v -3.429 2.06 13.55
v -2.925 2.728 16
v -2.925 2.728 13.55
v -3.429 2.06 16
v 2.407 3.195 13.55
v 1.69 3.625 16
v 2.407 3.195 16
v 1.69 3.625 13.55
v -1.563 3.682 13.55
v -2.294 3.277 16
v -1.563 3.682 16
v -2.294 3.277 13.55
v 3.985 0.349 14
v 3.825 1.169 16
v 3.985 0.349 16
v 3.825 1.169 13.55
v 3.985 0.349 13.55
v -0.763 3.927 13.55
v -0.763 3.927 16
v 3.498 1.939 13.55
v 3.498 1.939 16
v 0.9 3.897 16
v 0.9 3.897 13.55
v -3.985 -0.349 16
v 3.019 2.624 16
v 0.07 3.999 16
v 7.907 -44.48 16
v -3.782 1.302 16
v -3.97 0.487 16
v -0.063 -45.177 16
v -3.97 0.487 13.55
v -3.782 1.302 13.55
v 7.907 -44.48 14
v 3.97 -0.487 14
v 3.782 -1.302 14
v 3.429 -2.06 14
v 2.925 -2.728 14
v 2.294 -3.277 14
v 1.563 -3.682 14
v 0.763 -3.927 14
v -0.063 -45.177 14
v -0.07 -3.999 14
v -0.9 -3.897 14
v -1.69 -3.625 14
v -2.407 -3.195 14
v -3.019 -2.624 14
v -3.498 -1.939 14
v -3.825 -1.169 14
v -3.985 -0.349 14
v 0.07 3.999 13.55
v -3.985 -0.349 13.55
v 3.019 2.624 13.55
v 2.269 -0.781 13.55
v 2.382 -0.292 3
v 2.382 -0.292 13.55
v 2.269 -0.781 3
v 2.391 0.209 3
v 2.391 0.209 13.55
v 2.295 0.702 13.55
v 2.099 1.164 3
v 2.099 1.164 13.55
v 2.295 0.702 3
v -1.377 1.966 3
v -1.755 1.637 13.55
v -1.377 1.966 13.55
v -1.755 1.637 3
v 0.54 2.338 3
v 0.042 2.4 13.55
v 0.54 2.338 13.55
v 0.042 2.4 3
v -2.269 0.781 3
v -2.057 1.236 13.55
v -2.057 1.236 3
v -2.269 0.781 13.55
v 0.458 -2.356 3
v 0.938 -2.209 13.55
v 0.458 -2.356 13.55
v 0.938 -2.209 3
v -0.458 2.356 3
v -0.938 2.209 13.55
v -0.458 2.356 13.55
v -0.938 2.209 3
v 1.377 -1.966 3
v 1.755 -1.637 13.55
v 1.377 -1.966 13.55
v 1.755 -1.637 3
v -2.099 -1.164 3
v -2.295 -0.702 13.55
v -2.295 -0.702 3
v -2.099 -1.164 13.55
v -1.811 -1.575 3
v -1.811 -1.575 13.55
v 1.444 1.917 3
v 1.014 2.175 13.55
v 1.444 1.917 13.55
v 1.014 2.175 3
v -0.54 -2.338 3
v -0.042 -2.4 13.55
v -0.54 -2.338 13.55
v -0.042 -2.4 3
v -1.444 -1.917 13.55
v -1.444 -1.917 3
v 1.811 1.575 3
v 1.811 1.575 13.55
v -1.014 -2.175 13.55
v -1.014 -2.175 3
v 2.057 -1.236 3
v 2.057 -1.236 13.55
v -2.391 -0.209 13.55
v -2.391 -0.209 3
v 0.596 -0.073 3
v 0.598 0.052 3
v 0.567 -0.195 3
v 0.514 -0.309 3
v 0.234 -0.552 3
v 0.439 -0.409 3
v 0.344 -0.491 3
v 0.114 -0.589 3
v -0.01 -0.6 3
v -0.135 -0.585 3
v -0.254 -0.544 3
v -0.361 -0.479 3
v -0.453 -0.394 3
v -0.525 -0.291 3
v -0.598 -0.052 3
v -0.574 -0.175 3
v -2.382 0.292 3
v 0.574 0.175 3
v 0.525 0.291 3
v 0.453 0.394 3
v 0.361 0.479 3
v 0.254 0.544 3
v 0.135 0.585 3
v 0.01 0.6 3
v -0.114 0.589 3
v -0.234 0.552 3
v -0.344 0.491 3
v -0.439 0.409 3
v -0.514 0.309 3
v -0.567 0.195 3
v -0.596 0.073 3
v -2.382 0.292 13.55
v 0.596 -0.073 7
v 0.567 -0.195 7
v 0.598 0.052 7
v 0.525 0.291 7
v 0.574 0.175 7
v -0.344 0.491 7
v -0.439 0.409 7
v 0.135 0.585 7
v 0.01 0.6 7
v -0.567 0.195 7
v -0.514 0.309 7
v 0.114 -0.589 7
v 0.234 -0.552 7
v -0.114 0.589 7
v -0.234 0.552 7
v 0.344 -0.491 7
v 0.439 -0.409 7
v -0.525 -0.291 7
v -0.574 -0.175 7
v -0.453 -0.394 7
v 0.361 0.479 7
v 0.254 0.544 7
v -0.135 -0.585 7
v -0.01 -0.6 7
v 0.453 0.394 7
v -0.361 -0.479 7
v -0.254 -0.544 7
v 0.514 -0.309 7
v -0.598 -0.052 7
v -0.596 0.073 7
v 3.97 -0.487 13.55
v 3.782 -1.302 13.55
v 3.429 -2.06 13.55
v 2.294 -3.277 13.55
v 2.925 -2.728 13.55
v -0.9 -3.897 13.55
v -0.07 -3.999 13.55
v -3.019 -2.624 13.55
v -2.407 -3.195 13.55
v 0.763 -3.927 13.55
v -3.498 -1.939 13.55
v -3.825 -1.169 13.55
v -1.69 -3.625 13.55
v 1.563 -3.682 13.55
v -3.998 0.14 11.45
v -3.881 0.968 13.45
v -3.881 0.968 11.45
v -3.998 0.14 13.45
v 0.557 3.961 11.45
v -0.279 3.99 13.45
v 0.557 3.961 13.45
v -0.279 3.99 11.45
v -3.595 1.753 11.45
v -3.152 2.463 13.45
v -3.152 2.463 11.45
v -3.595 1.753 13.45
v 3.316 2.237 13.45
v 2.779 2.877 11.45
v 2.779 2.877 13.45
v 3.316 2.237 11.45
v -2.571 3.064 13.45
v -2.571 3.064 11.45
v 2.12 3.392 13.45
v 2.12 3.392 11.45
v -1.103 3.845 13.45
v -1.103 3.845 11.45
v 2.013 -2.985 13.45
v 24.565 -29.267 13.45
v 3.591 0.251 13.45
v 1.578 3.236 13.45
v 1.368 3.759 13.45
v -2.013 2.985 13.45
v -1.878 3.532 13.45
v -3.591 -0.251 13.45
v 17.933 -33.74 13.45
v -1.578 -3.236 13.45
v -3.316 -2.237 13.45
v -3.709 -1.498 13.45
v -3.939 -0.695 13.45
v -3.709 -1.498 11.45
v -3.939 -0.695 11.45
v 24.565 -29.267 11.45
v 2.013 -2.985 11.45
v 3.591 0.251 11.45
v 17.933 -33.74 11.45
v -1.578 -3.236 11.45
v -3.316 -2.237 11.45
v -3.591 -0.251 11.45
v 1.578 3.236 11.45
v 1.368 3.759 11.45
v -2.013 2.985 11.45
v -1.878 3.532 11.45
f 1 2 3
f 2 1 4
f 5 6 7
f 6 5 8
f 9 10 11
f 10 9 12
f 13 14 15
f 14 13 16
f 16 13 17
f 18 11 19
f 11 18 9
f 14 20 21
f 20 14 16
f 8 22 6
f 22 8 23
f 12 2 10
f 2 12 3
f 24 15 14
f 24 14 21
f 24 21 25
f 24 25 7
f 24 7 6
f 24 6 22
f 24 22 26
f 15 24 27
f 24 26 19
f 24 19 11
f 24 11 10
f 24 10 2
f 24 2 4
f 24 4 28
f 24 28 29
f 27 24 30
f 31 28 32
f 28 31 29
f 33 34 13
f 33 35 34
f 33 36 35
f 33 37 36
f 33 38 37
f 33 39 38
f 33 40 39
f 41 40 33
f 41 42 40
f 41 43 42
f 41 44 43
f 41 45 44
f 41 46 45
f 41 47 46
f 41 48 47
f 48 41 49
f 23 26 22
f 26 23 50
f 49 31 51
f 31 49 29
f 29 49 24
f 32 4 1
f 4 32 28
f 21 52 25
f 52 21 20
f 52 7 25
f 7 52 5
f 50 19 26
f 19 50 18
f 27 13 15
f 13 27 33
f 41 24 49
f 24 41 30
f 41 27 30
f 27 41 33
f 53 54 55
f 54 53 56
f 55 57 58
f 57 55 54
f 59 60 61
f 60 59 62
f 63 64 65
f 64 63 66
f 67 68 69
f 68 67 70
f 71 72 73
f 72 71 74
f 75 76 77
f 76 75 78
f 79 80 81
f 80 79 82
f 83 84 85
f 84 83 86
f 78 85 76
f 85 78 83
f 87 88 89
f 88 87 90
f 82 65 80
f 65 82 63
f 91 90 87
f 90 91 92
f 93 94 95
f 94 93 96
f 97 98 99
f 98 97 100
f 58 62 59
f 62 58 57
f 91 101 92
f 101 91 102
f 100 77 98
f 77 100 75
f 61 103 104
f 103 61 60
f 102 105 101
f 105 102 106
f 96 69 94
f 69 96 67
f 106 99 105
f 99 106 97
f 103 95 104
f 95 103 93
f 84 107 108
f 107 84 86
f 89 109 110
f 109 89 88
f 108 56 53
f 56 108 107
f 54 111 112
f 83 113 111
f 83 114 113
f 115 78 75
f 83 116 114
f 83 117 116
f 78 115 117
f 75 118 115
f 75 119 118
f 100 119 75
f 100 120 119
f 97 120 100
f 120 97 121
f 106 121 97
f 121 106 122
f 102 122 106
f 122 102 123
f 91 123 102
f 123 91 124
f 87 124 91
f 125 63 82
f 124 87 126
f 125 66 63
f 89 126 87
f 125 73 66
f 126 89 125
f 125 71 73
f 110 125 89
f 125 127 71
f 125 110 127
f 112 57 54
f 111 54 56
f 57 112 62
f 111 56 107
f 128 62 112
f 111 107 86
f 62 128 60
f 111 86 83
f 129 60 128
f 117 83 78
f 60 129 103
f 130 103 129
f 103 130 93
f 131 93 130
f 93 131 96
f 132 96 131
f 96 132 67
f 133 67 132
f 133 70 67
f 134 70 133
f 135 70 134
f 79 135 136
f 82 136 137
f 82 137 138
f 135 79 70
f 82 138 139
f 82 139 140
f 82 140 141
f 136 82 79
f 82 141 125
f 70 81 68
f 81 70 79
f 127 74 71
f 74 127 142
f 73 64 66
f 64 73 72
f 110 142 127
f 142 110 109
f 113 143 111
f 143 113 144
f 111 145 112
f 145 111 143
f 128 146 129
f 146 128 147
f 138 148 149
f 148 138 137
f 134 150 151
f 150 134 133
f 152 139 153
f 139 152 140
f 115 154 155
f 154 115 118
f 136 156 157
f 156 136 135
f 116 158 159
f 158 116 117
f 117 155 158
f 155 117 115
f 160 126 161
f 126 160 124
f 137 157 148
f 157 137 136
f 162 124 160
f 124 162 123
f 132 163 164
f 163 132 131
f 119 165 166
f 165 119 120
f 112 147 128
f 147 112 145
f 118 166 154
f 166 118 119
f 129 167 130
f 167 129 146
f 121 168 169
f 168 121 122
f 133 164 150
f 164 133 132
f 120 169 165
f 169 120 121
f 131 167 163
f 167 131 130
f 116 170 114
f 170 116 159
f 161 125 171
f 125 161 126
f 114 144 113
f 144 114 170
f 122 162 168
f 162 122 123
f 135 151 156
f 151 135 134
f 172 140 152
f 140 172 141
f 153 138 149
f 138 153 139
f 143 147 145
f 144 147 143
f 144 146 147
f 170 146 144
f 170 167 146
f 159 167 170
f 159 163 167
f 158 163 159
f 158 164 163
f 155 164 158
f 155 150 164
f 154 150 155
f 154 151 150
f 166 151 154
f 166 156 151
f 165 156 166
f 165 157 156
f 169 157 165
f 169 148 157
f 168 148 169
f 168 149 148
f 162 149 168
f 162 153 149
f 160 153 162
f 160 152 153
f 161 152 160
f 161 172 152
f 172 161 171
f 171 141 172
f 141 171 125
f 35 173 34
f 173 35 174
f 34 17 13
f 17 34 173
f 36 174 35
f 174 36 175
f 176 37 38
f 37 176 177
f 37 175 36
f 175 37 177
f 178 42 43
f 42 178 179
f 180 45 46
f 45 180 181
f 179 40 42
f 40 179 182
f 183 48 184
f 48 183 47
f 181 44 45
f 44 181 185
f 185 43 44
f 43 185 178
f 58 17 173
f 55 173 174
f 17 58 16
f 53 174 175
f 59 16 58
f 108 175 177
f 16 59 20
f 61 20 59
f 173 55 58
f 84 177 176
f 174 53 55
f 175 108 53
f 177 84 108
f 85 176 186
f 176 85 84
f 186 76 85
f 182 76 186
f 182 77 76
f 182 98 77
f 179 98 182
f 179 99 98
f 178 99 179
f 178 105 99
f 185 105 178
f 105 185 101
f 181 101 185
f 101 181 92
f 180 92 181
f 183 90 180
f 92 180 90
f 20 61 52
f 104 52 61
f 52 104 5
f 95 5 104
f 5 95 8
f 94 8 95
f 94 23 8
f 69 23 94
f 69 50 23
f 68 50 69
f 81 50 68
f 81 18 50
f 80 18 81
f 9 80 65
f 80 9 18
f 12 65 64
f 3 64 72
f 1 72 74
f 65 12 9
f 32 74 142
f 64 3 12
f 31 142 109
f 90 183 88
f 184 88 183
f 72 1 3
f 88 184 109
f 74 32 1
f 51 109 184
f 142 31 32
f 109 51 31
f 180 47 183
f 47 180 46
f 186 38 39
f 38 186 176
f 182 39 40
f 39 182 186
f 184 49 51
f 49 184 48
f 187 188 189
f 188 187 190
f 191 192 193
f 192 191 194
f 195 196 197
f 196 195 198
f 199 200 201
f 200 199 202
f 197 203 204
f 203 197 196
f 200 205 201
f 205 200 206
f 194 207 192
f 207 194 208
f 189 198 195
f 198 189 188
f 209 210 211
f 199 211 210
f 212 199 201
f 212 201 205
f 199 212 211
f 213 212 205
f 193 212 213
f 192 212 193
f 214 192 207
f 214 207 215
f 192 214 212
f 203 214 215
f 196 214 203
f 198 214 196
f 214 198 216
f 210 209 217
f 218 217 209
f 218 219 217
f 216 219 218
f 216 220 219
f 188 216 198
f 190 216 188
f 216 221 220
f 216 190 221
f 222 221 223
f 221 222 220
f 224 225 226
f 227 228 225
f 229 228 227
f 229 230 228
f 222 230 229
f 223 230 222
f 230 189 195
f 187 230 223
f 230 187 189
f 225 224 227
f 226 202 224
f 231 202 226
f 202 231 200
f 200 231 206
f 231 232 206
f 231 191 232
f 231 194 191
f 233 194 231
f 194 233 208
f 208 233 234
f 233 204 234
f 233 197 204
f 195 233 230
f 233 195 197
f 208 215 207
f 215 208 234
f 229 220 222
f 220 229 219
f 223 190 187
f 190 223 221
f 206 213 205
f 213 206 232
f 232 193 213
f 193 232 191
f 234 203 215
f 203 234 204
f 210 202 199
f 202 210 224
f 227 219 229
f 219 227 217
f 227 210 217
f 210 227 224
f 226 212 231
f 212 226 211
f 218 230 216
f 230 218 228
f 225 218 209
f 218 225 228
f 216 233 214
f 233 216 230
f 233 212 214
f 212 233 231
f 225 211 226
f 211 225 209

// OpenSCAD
// file: parametric_involute_gear_v5.0.scad
// Parametric Involute Bevel and Spur Gears by GregFrost
// It is licensed under the Creative Commons - GNU GPL license.
// © 2010 by GregFrost
// http://www.thingiverse.com/thing:3575

// Simple Test:
//gear (circular_pitch=700,
//	gear_thickness = 12,
//	rim_thickness = 15,
//	hub_thickness = 17,
//	circles=8);

//Complex Spur Gear Test:
//test_gears ();

// Meshing Double Helix:
//meshing_double_helix ();

// Demonstrate the backlash option for Spur gears.
//test_backlash ();

// Demonstrate how to make meshing bevel gears.
bevel_gear_pair ();

pi=3.1415926535897932384626433832795;

//==================================================
// Bevel Gears:
// Two gears with the same cone distance, circular pitch (measured at the cone distance) 
// and pressure angle will mesh.

module bevel_gear_pair (
	gear1_teeth = 41,
	gear2_teeth = 7,
	axis_angle = 90,
	outside_circular_pitch=1000)
{
	outside_pitch_radius1 = gear1_teeth * outside_circular_pitch / 360;
	outside_pitch_radius2 = gear2_teeth * outside_circular_pitch / 360;
	pitch_apex1=outside_pitch_radius2 * sin (axis_angle) + 
		(outside_pitch_radius2 * cos (axis_angle) + outside_pitch_radius1) / tan (axis_angle);
	cone_distance = sqrt (pow (pitch_apex1, 2) + pow (outside_pitch_radius1, 2));
	pitch_apex2 = sqrt (pow (cone_distance, 2) - pow (outside_pitch_radius2, 2));
	echo ("cone_distance", cone_distance);
	pitch_angle1 = asin (outside_pitch_radius1 / cone_distance);
	pitch_angle2 = asin (outside_pitch_radius2 / cone_distance);
	echo ("pitch_angle1, pitch_angle2", pitch_angle1, pitch_angle2);
	echo ("pitch_angle1 + pitch_angle2", pitch_angle1 + pitch_angle2);

	rotate([0,0,90])
	translate ([0,0,pitch_apex1+20])
	{
		translate([0,0,-pitch_apex1])
		bevel_gear (
			number_of_teeth=gear1_teeth,
			cone_distance=cone_distance,
			pressure_angle=30,
			outside_circular_pitch=outside_circular_pitch);
	
		rotate([0,-(pitch_angle1+pitch_angle2),0])
		translate([0,0,-pitch_apex2])
		bevel_gear (
			number_of_teeth=gear2_teeth,
			cone_distance=cone_distance,
			pressure_angle=30,
			outside_circular_pitch=outside_circular_pitch);
	}
}

//Bevel Gear Finishing Options:
bevel_gear_flat = 0;
bevel_gear_back_cone = 1;

module bevel_gear (
	number_of_teeth=11,
	cone_distance=100,
	face_width=20,
	outside_circular_pitch=1000,
	pressure_angle=30,
	clearance = 0.2,
	bore_diameter=5,
	gear_thickness = 15,
	backlash = 0,
	involute_facets=0,
	finish = -1)
{
	echo ("bevel_gear",
		"teeth", number_of_teeth,
		"cone distance", cone_distance,
		face_width,
		outside_circular_pitch,
		pressure_angle,
		clearance,
		bore_diameter,
		involute_facets,
		finish);

	// Pitch diameter: Diameter of pitch circle at the fat end of the gear.
	outside_pitch_diameter  =  number_of_teeth * outside_circular_pitch / 180;
	outside_pitch_radius = outside_pitch_diameter / 2;

	// The height of the pitch apex.
	pitch_apex = sqrt (pow (cone_distance, 2) - pow (outside_pitch_radius, 2));
	pitch_angle = asin (outside_pitch_radius/cone_distance);

	echo ("Num Teeth:", number_of_teeth, " Pitch Angle:", pitch_angle);

	finish = (finish != -1) ? finish : (pitch_angle < 45) ? bevel_gear_flat : bevel_gear_back_cone;

	apex_to_apex=cone_distance / cos (pitch_angle);
	back_cone_radius = apex_to_apex * sin (pitch_angle);

	// Calculate and display the pitch angle. This is needed to determine the angle to mount two meshing cone gears.

	// Base Circle for forming the involute teeth shape.
	base_radius = back_cone_radius * cos (pressure_angle);	

	// Diametrial pitch: Number of teeth per unit length.
	pitch_diametrial = number_of_teeth / outside_pitch_diameter;

	// Addendum: Radial distance from pitch circle to outside circle.
	addendum = 1 / pitch_diametrial;
	// Outer Circle
	outer_radius = back_cone_radius + addendum;

	// Dedendum: Radial distance from pitch circle to root diameter
	dedendum = addendum + clearance;
	dedendum_angle = atan (dedendum / cone_distance);
	root_angle = pitch_angle - dedendum_angle;

	root_cone_full_radius = tan (root_angle)*apex_to_apex;
	back_cone_full_radius=apex_to_apex / tan (pitch_angle);

	back_cone_end_radius = 
		outside_pitch_radius - 
		dedendum * cos (pitch_angle) - 
		gear_thickness / tan (pitch_angle);
	back_cone_descent = dedendum * sin (pitch_angle) + gear_thickness;

	// Root diameter: Diameter of bottom of tooth spaces.
	root_radius = back_cone_radius - dedendum;

	half_tooth_thickness = outside_pitch_radius * sin (360 / (4 * number_of_teeth)) - backlash / 4;
	half_thick_angle = asin (half_tooth_thickness / back_cone_radius);

	face_cone_height = apex_to_apex-face_width / cos (pitch_angle);
	face_cone_full_radius = face_cone_height / tan (pitch_angle);
	face_cone_descent = dedendum * sin (pitch_angle);
	face_cone_end_radius = 
		outside_pitch_radius -
		face_width / sin (pitch_angle) - 
		face_cone_descent / tan (pitch_angle);

	// For the bevel_gear_flat finish option, calculate the height of a cube to select the portion of the gear that includes the full pitch face.
	bevel_gear_flat_height = pitch_apex - (cone_distance - face_width) * cos (pitch_angle);

//	translate([0,0,-pitch_apex])
	difference ()
	{
		intersection ()
		{
			union()
			{
				rotate (half_thick_angle)
				translate ([0,0,pitch_apex-apex_to_apex])
				cylinder ($fn=number_of_teeth*2, r1=root_cone_full_radius,r2=0,h=apex_to_apex);
				for (i = [1:number_of_teeth])
//				for (i = [1:1])
				{
					rotate ([0,0,i*360/number_of_teeth])
					{
						involute_bevel_gear_tooth (
							back_cone_radius = back_cone_radius,
							root_radius = root_radius,
							base_radius = base_radius,
							outer_radius = outer_radius,
							pitch_apex = pitch_apex,
							cone_distance = cone_distance,
							half_thick_angle = half_thick_angle,
							involute_facets = involute_facets);
					}
				}
			}

			if (finish == bevel_gear_back_cone)
			{
				translate ([0,0,-back_cone_descent])
				cylinder (
					$fn=number_of_teeth*2, 
					r1=back_cone_end_radius,
					r2=back_cone_full_radius*2,
					h=apex_to_apex + back_cone_descent);
			}
			else
			{
				translate ([-1.5*outside_pitch_radius,-1.5*outside_pitch_radius,0])
				cube ([3*outside_pitch_radius,
					3*outside_pitch_radius,
					bevel_gear_flat_height]);
			}
		}
		
		if (finish == bevel_gear_back_cone)
		{
			translate ([0,0,-face_cone_descent])
			cylinder (
				r1=face_cone_end_radius,
				r2=face_cone_full_radius * 2,
				h=face_cone_height + face_cone_descent+pitch_apex);
		}

		translate ([0,0,pitch_apex - apex_to_apex])
		cylinder (r=bore_diameter/2,h=apex_to_apex);
	}	
}

module involute_bevel_gear_tooth (
	back_cone_radius,
	root_radius,
	base_radius,
	outer_radius,
	pitch_apex,
	cone_distance,
	half_thick_angle,
	involute_facets)
{
//	echo ("involute_bevel_gear_tooth",
//		back_cone_radius,
//		root_radius,
//		base_radius,
//		outer_radius,
//		pitch_apex,
//		cone_distance,
//		half_thick_angle);

	min_radius = max (base_radius*2,root_radius*2);

	pitch_point = 
		involute (
			base_radius*2, 
			involute_intersect_angle (base_radius*2, back_cone_radius*2));
	pitch_angle = atan2 (pitch_point[1], pitch_point[0]);
	centre_angle = pitch_angle + half_thick_angle;

	start_angle = involute_intersect_angle (base_radius*2, min_radius);
	stop_angle = involute_intersect_angle (base_radius*2, outer_radius*2);

	res=(involute_facets!=0)?involute_facets:($fn==0)?5:$fn/4;

	translate ([0,0,pitch_apex])
	rotate ([0,-atan(back_cone_radius/cone_distance),0])
	translate ([-back_cone_radius*2,0,-cone_distance*2])
	union ()
	{
		for (i=[1:res])
		{
			assign (
				point1=
					involute (base_radius*2,start_angle+(stop_angle - start_angle)*(i-1)/res),
				point2=
					involute (base_radius*2,start_angle+(stop_angle - start_angle)*(i)/res))
			{
				assign (
					side1_point1 = rotate_point (centre_angle, point1),
					side1_point2 = rotate_point (centre_angle, point2),
					side2_point1 = mirror_point (rotate_point (centre_angle, point1)),
					side2_point2 = mirror_point (rotate_point (centre_angle, point2)))
				{
					polyhedron (
						points=[
							[back_cone_radius*2+0.1,0,cone_distance*2],
							[side1_point1[0],side1_point1[1],0],
							[side1_point2[0],side1_point2[1],0],
							[side2_point2[0],side2_point2[1],0],
							[side2_point1[0],side2_point1[1],0],
							[0.1,0,0]],
						triangles=[[0,1,2],[0,2,3],[0,3,4],[0,5,1],[1,5,2],[2,5,3],[3,5,4],[0,4,5]]);
				}
			}
		}
	}
}

module gear (
	number_of_teeth=15,
	circular_pitch=false, diametral_pitch=false,
	pressure_angle=28,
	clearance = 0.2,
	gear_thickness=5,
	rim_thickness=8,
	rim_width=5,
	hub_thickness=10,
	hub_diameter=15,
	bore_diameter=5,
	circles=0,
	backlash=0,
	twist=0,
	involute_facets=0)
{
	if (circular_pitch==false && diametral_pitch==false) 
		echo("MCAD ERROR: gear module needs either a diametral_pitch or circular_pitch");

	//Convert diametrial pitch to our native circular pitch
	circular_pitch = (circular_pitch!=false?circular_pitch:180/diametral_pitch);

	// Pitch diameter: Diameter of pitch circle.
	pitch_diameter  =  number_of_teeth * circular_pitch / 180;
	pitch_radius = pitch_diameter/2;
	echo ("Teeth:", number_of_teeth, " Pitch radius:", pitch_radius);

	// Base Circle
	base_radius = pitch_radius*cos(pressure_angle);

	// Diametrial pitch: Number of teeth per unit length.
	pitch_diametrial = number_of_teeth / pitch_diameter;

	// Addendum: Radial distance from pitch circle to outside circle.
	addendum = 1/pitch_diametrial;

	//Outer Circle
	outer_radius = pitch_radius+addendum;

	// Dedendum: Radial distance from pitch circle to root diameter
	dedendum = addendum + clearance;

	// Root diameter: Diameter of bottom of tooth spaces.
	root_radius = pitch_radius-dedendum;
	backlash_angle = backlash / pitch_radius * 180 / pi;
	half_thick_angle = (360 / number_of_teeth - backlash_angle) / 4;

	// Variables controlling the rim.
	rim_radius = root_radius - rim_width;

	// Variables controlling the circular holes in the gear.
	circle_orbit_diameter=hub_diameter/2+rim_radius;
	circle_orbit_curcumference=pi*circle_orbit_diameter;

	// Limit the circle size to 90% of the gear face.
	circle_diameter=
		min (
			0.70*circle_orbit_curcumference/circles,
			(rim_radius-hub_diameter/2)*0.9);

	difference ()
	{
		union ()
		{
			difference ()
			{
				linear_extrude (height=rim_thickness, convexity=10, twist=twist)
				gear_shape (
					number_of_teeth,
					pitch_radius = pitch_radius,
					root_radius = root_radius,
					base_radius = base_radius,
					outer_radius = outer_radius,
					half_thick_angle = half_thick_angle,
					involute_facets=involute_facets);

				if (gear_thickness < rim_thickness)
					translate ([0,0,gear_thickness])
					cylinder (r=rim_radius,h=rim_thickness-gear_thickness+1);
			}
			if (gear_thickness > rim_thickness)
				cylinder (r=rim_radius,h=gear_thickness);
			if (hub_thickness > gear_thickness)
				translate ([0,0,gear_thickness])
				cylinder (r=hub_diameter/2,h=hub_thickness-gear_thickness);
		}
		translate ([0,0,-1])
		cylinder (
			r=bore_diameter/2,
			h=2+max(rim_thickness,hub_thickness,gear_thickness));
		if (circles>0)
		{
			for(i=[0:circles-1])	
				rotate([0,0,i*360/circles])
				translate([circle_orbit_diameter/2,0,-1])
				cylinder(r=circle_diameter/2,h=max(gear_thickness,rim_thickness)+3);
		}
	}
}

module gear_shape (
	number_of_teeth,
	pitch_radius,
	root_radius,
	base_radius,
	outer_radius,
	half_thick_angle,
	involute_facets)
{
	union()
	{
		rotate (half_thick_angle) circle ($fn=number_of_teeth*2, r=root_radius);

		for (i = [1:number_of_teeth])
		{
			rotate ([0,0,i*360/number_of_teeth])
			{
				involute_gear_tooth (
					pitch_radius = pitch_radius,
					root_radius = root_radius,
					base_radius = base_radius,
					outer_radius = outer_radius,
					half_thick_angle = half_thick_angle,
					involute_facets=involute_facets);
			}
		}
	}
}

module involute_gear_tooth (
	pitch_radius,
	root_radius,
	base_radius,
	outer_radius,
	half_thick_angle,
	involute_facets)
{
	min_radius = max (base_radius,root_radius);

	pitch_point = involute (base_radius, involute_intersect_angle (base_radius, pitch_radius));
	pitch_angle = atan2 (pitch_point[1], pitch_point[0]);
	centre_angle = pitch_angle + half_thick_angle;

	start_angle = involute_intersect_angle (base_radius, min_radius);
	stop_angle = involute_intersect_angle (base_radius, outer_radius);

	res=(involute_facets!=0)?involute_facets:($fn==0)?5:$fn/4;

	union ()
	{
		for (i=[1:res])
		assign (
			point1=involute (base_radius,start_angle+(stop_angle - start_angle)*(i-1)/res),
			point2=involute (base_radius,start_angle+(stop_angle - start_angle)*i/res))
		{
			assign (
				side1_point1=rotate_point (centre_angle, point1),
				side1_point2=rotate_point (centre_angle, point2),
				side2_point1=mirror_point (rotate_point (centre_angle, point1)),
				side2_point2=mirror_point (rotate_point (centre_angle, point2)))
			{
				polygon (
					points=[[0,0],side1_point1,side1_point2,side2_point2,side2_point1],
					paths=[[0,1,2,3,4,0]]);
			}
		}
	}
}

// Mathematical Functions
//===============

// Finds the angle of the involute about the base radius at the given distance (radius) from it's center.
//source: http://www.mathhelpforum.com/math-help/geometry/136011-circle-involute-solving-y-any-given-x.html

function involute_intersect_angle (base_radius, radius) = sqrt (pow (radius/base_radius, 2) - 1) * 180 / pi;

// Calculate the involute position for a given base radius and involute angle.

function rotated_involute (rotate, base_radius, involute_angle) = 
[
	cos (rotate) * involute (base_radius, involute_angle)[0] + sin (rotate) * involute (base_radius, involute_angle)[1],
	cos (rotate) * involute (base_radius, involute_angle)[1] - sin (rotate) * involute (base_radius, involute_angle)[0]
];

function mirror_point (coord) = 
[
	coord[0], 
	-coord[1]
];

function rotate_point (rotate, coord) =
[
	cos (rotate) * coord[0] + sin (rotate) * coord[1],
	cos (rotate) * coord[1] - sin (rotate) * coord[0]
];

function involute (base_radius, involute_angle) = 
[
	base_radius*(cos (involute_angle) + involute_angle*pi/180*sin (involute_angle)),
	base_radius*(sin (involute_angle) - involute_angle*pi/180*cos (involute_angle)),
];


// Test Cases
//===============

module test_gears()
{
	translate([17,-15])
	{
		gear (number_of_teeth=17,
			circular_pitch=500,
			circles=8);
	
		rotate ([0,0,360*4/17])
		translate ([39.088888,0,0])
		{
			gear (number_of_teeth=11,
				circular_pitch=500,
				hub_diameter=0,
				rim_width=65);
			translate ([0,0,8])
			{
				gear (number_of_teeth=6,
					circular_pitch=300,
					hub_diameter=0,
					rim_width=5,
					rim_thickness=6,
					pressure_angle=31);
				rotate ([0,0,360*5/6])
				translate ([22.5,0,1])
				gear (number_of_teeth=21,
					circular_pitch=300,
					bore_diameter=2,
					hub_diameter=4,
					rim_width=1,
					hub_thickness=4,
					rim_thickness=4,
					gear_thickness=3,
					pressure_angle=31);
			}
		}

		translate ([-61.1111111,0,0])
		{
			gear (number_of_teeth=27,
				circular_pitch=500,
				circles=5,
				hub_diameter=2*8.88888889);

			translate ([0,0,10])
			{
				gear (
					number_of_teeth=14,
					circular_pitch=200,
					pressure_angle=5,
					clearance = 0.2,
					gear_thickness = 10,
					rim_thickness = 10,
					rim_width = 15,
					bore_diameter=5,
					circles=0);
				translate ([13.8888888,0,1])
				gear (
					number_of_teeth=11,
					circular_pitch=200,
					pressure_angle=5,
					clearance = 0.2,
					gear_thickness = 10,
					rim_thickness = 10,
					rim_width = 15,
					hub_thickness = 20,
					hub_diameter=2*7.222222,
					bore_diameter=5,
					circles=0);
			}
		}
	
		rotate ([0,0,360*-5/17])
		translate ([44.444444444,0,0])
		gear (number_of_teeth=15,
			circular_pitch=500,
			hub_diameter=10,
			rim_width=5,
			rim_thickness=5,
			gear_thickness=4,
			hub_thickness=6,
			circles=9);
	
		rotate ([0,0,360*-1/17])
		translate ([30.5555555,0,-1])
		gear (number_of_teeth=5,
			circular_pitch=500,
			hub_diameter=0,
			rim_width=5,
			rim_thickness=10);
	}
}

module meshing_double_helix ()
{
	test_double_helix_gear ();
	
	mirror ([0,1,0])
	translate ([58.33333333,0,0])
	test_double_helix_gear (teeth=13,circles=6);
}

module test_double_helix_gear (
	teeth=17,
	circles=8)
{
	//double helical gear
	{
		twist=200;
		height=20;
		pressure_angle=30;

		gear (number_of_teeth=teeth,
			circular_pitch=700,
			pressure_angle=pressure_angle,
			clearance = 0.2,
			gear_thickness = height/2*0.5,
			rim_thickness = height/2,
			rim_width = 5,
			hub_thickness = height/2*1.2,
			hub_diameter=15,
			bore_diameter=5,
			circles=circles,
			twist=twist/teeth);
		mirror([0,0,1])
		gear (number_of_teeth=teeth,
			circular_pitch=700,
			pressure_angle=pressure_angle,
			clearance = 0.2,
			gear_thickness = height/2,
			rim_thickness = height/2,
			rim_width = 5,
			hub_thickness = height/2,
			hub_diameter=15,
			bore_diameter=5,
			circles=circles,
			twist=twist/teeth);
	}
}

module test_backlash ()
{
	backlash = 2;
	teeth = 15;

	translate ([-29.166666,0,0])
	{
		translate ([58.3333333,0,0])
		rotate ([0,0,-360/teeth/4])
		gear (
			number_of_teeth = teeth,
			circular_pitch=700,
			gear_thickness = 12,
			rim_thickness = 15,
			rim_width = 5,
			hub_thickness = 17,
			hub_diameter=15,
			bore_diameter=5,
			backlash = 2,
			circles=8);
		
		rotate ([0,0,360/teeth/4])
		gear (
			number_of_teeth = teeth,
			circular_pitch=700,
			gear_thickness = 12,
			rim_thickness = 15,
			rim_width = 5,
			hub_thickness = 17,
			hub_diameter=15,
			bore_diameter=5,
			backlash = 2,
			circles=8);
	}

	color([0,0,128,0.5])
	translate([0,0,-5])
	cylinder ($fn=20,r=backlash / 4,h=25);
}
// file: frame.scad
include<config.scad>

dim_frame_length = dim_axle_offset + 1;
dim_motor_block_len = 5;
dim_motor_block_thickness = 9;

module motorFrame(){
	rad = rad_hour_tube + dim_frame_wall;

	difference() {
		union(){
			cylinder(h=dim_frame_thickness, r = rad);
			translate([ 0, -rad, 0])cube([dim_frame_length, 2 * rad, dim_frame_thickness]);
		}
		translate([ 0, 0, -1])cylinder(h=dim_frame_thickness + 2, r = rad_hour_tube + dim_gap);
	}

	translate([ dim_frame_length - dim_motor_block_len, - rad, -dim_motor_block_thickness]){
		cube([dim_motor_block_len, 2 * rad, dim_motor_block_thickness]);
	}
}
// file: motor.scad
include<config.scad>


module motor(){
	color("LightSlateGray"){
		cylinder(r = rad_motor, h = dim_motor_len - 1);
		cylinder(r = 1.5, h = dim_motor_len);
		translate([ 0, 0, dim_motor_len - dim_motor_mount - 1]){
			rotate([ 0, 0, -40])translate([ rad_motor, 0, 0]) _motor_screw_mount();
			rotate([ 0, 0, 40])translate([ rad_motor, 0, 0]) _motor_screw_mount();
		}
	}
	//translate([ 0, -2, 0])cube(4);
}

module _motor_screw_mount(){
	difference() {
		cylinder(r = 1.5, h = dim_motor_mount);
		cylinder(r = rad_14_screw, h = 3, center = true);
	}
}
// file: config.scad
fast = true;

dim_gear_thickness = 2;
motor_bore = 1.5;

dim_gap = 0.2;

num_motor_teeth = 10;
num_hand_teeth = 36;

qty_circular_pitch  = 200;
dim_axle_offset = (num_motor_teeth * qty_circular_pitch / 360 ) + (num_hand_teeth * qty_circular_pitch / 360 );

dim_hand_width = 8;
dim_hand_hour = 45;
dim_hand_thickness = 2;

dim_hand_minute = 38;
rad_face = 50;

rad_hour_tube = 3.5;

dim_hand_hour_connector = 3.3;
dim_hand_minute_connector = 3.5;
dim_hand_hour_height = 15;

dim_hand_minute_height = 8.45;


rad_14_screw = 1.4/2 - 0.1;
rad_14_screw_pass = 1.45/2;
dim_14_screw = 6;

dim_gear_layer = 1;

dim_motor_len = 9;
rad_motor = 3;
dim_motor_mount = 1;

rad_hour_motor = 30;


dim_frame_thickness = 2;
dim_frame_wall = 2.5;
// file: handGear.scad
use<parametric_involute_gear_v5.0.scad>
include<config.scad>

module handGear(){
	if(fast){
		cylinder(r=dim_axle_offset - 6, h=dim_gear_thickness);
	}
	if(!fast){
		gear (
			circular_pitch=qty_circular_pitch,
			bore_diameter = 0,
			number_of_teeth = num_hand_teeth,
			gear_thickness = dim_gear_thickness,
			rim_thickness = dim_gear_thickness,
			hub_thickness = dim_gear_thickness,
			circles=8);
	}
}


module minuteGear(){
	color("DarkSeaGreen"){
		difference() {
			union(){
				handGear();
				cylinder(h = dim_hand_minute_height, r=rad_hour_tube);
				translate([ 0, 0, dim_hand_minute_height])cylinder(r=dim_hand_minute_connector, h = dim_hand_thickness, $fn = 6);
			}
			cylinder(h = 40, r=rad_hour_tube-1 , center=true);
		}
	}
}

module minuteHand(){
	color("OliveDrab"){
		difference() {
			union(){
				cylinder(r = dim_hand_width / 2, h = dim_hand_thickness);
				//cylinder(h = dim_hand_minute_height, r=rad_hour_tube);
				translate([- 0.5 * dim_hand_width, 0, 0])cube([dim_hand_width,dim_hand_minute, dim_hand_thickness]);
			}
			rotate([ 0, 0, 90])cylinder(r=dim_hand_minute_connector + 0.1, h = 100, $fn = 6, center = true);
		}
	}
}

module hourHand(){
	color("Chocolate"){
		difference() {
			union(){
				cylinder(h = dim_hand_thickness, r=rad_hour_tube + 0.5);
				translate([- 0.5 * dim_hand_width, 0, 0])cube([dim_hand_width,dim_hand_hour, dim_hand_thickness]);
				cylinder(h = dim_hand_hour_height - dim_gear_thickness, r=rad_hour_tube - 1.1);
				//translate([-0.5 * dim_hand_hour_connector, -0.5 * dim_hand_hour_connector, dim_hand_hour_height - dim_gear_thickness]) cube([dim_hand_hour_connector, dim_hand_hour_connector, dim_gear_thickness / 2 + dim_gear_layer]);
			}
			translate([ 0, 0, dim_hand_hour_height - ( dim_14_screw )]) cylinder(r=  rad_14_screw, h=dim_14_screw);
		}
		cylinder(r = dim_hand_width / 2, h = dim_hand_thickness + 0.45 );
	}
}


module hourGear(){
	color("BurlyWood"){
		difference() {
			union(){
				//handGear();
				cylinder(r=5,h=dim_gear_layer + dim_gear_thickness);
			}
			translate([ -0.5 * dim_hand_hour_connector, -0.5 * dim_hand_hour_connector, dim_gear_thickness / 2])cube([dim_hand_hour_connector, dim_hand_hour_connector, 20]);
			cylinder( h = 20, r= rad_14_screw_pass, center=true);
		}
		difference() {
			translate([ 0, 0, dim_gear_thickness * 1])cylinder(r = 18,h=dim_gear_layer);
			cylinder(r=16,h=20,center = true);
		}
	}

}
// file: motorGear.scad
use<parametric_involute_gear_v5.0.scad>
include<config.scad>

module motorGear(){
	if(fast){
		cylinder(r = 6, h = dim_gear_thickness);
	}
	if(!fast){
		gear (
			circular_pitch=200,
			bore_diameter = motor_bore,
			number_of_teeth = num_motor_teeth,
			gear_thickness = dim_gear_thickness,
			rim_thickness = dim_gear_thickness,
			hub_thickness = dim_gear_thickness,
			circles=0);
	}
}
// main file
$fn = 30;

use<motorGear.scad>
use<handGear.scad>
include<config.scad>
use<motor.scad>
use<frame.scad>


module asm(){
	rotate([0,0,5]){
		//hourGear();
		translate([ 0, 0, dim_hand_hour_height + dim_gear_thickness / 2])rotate([ 180, 0, 0])hourHand();
	}


	translate([ 0, 0, dim_gear_thickness + dim_gear_layer]){
		//rotate([0,0,5])minuteGear();
		rotate([ 0, 0, -rad_hour_motor])
		translate([ -1 * dim_axle_offset, 0, 0]){
		}
	}

	translate([ 0, 0, 2 *dim_gear_thickness + dim_gear_layer + dim_hand_minute_height])rotate([180,0,34])minuteHand();

}

//minuteHand();
//minuteGear();
//hourGear();
//hourHand();

asm();
//motorFrame();

//motor();

//face();

module face(){
	difference() {
		cylinder(r=rad_face,h=20, center = true);
		cylinder(r=rad_face - 2 ,h=25, center = true);
	}
}
